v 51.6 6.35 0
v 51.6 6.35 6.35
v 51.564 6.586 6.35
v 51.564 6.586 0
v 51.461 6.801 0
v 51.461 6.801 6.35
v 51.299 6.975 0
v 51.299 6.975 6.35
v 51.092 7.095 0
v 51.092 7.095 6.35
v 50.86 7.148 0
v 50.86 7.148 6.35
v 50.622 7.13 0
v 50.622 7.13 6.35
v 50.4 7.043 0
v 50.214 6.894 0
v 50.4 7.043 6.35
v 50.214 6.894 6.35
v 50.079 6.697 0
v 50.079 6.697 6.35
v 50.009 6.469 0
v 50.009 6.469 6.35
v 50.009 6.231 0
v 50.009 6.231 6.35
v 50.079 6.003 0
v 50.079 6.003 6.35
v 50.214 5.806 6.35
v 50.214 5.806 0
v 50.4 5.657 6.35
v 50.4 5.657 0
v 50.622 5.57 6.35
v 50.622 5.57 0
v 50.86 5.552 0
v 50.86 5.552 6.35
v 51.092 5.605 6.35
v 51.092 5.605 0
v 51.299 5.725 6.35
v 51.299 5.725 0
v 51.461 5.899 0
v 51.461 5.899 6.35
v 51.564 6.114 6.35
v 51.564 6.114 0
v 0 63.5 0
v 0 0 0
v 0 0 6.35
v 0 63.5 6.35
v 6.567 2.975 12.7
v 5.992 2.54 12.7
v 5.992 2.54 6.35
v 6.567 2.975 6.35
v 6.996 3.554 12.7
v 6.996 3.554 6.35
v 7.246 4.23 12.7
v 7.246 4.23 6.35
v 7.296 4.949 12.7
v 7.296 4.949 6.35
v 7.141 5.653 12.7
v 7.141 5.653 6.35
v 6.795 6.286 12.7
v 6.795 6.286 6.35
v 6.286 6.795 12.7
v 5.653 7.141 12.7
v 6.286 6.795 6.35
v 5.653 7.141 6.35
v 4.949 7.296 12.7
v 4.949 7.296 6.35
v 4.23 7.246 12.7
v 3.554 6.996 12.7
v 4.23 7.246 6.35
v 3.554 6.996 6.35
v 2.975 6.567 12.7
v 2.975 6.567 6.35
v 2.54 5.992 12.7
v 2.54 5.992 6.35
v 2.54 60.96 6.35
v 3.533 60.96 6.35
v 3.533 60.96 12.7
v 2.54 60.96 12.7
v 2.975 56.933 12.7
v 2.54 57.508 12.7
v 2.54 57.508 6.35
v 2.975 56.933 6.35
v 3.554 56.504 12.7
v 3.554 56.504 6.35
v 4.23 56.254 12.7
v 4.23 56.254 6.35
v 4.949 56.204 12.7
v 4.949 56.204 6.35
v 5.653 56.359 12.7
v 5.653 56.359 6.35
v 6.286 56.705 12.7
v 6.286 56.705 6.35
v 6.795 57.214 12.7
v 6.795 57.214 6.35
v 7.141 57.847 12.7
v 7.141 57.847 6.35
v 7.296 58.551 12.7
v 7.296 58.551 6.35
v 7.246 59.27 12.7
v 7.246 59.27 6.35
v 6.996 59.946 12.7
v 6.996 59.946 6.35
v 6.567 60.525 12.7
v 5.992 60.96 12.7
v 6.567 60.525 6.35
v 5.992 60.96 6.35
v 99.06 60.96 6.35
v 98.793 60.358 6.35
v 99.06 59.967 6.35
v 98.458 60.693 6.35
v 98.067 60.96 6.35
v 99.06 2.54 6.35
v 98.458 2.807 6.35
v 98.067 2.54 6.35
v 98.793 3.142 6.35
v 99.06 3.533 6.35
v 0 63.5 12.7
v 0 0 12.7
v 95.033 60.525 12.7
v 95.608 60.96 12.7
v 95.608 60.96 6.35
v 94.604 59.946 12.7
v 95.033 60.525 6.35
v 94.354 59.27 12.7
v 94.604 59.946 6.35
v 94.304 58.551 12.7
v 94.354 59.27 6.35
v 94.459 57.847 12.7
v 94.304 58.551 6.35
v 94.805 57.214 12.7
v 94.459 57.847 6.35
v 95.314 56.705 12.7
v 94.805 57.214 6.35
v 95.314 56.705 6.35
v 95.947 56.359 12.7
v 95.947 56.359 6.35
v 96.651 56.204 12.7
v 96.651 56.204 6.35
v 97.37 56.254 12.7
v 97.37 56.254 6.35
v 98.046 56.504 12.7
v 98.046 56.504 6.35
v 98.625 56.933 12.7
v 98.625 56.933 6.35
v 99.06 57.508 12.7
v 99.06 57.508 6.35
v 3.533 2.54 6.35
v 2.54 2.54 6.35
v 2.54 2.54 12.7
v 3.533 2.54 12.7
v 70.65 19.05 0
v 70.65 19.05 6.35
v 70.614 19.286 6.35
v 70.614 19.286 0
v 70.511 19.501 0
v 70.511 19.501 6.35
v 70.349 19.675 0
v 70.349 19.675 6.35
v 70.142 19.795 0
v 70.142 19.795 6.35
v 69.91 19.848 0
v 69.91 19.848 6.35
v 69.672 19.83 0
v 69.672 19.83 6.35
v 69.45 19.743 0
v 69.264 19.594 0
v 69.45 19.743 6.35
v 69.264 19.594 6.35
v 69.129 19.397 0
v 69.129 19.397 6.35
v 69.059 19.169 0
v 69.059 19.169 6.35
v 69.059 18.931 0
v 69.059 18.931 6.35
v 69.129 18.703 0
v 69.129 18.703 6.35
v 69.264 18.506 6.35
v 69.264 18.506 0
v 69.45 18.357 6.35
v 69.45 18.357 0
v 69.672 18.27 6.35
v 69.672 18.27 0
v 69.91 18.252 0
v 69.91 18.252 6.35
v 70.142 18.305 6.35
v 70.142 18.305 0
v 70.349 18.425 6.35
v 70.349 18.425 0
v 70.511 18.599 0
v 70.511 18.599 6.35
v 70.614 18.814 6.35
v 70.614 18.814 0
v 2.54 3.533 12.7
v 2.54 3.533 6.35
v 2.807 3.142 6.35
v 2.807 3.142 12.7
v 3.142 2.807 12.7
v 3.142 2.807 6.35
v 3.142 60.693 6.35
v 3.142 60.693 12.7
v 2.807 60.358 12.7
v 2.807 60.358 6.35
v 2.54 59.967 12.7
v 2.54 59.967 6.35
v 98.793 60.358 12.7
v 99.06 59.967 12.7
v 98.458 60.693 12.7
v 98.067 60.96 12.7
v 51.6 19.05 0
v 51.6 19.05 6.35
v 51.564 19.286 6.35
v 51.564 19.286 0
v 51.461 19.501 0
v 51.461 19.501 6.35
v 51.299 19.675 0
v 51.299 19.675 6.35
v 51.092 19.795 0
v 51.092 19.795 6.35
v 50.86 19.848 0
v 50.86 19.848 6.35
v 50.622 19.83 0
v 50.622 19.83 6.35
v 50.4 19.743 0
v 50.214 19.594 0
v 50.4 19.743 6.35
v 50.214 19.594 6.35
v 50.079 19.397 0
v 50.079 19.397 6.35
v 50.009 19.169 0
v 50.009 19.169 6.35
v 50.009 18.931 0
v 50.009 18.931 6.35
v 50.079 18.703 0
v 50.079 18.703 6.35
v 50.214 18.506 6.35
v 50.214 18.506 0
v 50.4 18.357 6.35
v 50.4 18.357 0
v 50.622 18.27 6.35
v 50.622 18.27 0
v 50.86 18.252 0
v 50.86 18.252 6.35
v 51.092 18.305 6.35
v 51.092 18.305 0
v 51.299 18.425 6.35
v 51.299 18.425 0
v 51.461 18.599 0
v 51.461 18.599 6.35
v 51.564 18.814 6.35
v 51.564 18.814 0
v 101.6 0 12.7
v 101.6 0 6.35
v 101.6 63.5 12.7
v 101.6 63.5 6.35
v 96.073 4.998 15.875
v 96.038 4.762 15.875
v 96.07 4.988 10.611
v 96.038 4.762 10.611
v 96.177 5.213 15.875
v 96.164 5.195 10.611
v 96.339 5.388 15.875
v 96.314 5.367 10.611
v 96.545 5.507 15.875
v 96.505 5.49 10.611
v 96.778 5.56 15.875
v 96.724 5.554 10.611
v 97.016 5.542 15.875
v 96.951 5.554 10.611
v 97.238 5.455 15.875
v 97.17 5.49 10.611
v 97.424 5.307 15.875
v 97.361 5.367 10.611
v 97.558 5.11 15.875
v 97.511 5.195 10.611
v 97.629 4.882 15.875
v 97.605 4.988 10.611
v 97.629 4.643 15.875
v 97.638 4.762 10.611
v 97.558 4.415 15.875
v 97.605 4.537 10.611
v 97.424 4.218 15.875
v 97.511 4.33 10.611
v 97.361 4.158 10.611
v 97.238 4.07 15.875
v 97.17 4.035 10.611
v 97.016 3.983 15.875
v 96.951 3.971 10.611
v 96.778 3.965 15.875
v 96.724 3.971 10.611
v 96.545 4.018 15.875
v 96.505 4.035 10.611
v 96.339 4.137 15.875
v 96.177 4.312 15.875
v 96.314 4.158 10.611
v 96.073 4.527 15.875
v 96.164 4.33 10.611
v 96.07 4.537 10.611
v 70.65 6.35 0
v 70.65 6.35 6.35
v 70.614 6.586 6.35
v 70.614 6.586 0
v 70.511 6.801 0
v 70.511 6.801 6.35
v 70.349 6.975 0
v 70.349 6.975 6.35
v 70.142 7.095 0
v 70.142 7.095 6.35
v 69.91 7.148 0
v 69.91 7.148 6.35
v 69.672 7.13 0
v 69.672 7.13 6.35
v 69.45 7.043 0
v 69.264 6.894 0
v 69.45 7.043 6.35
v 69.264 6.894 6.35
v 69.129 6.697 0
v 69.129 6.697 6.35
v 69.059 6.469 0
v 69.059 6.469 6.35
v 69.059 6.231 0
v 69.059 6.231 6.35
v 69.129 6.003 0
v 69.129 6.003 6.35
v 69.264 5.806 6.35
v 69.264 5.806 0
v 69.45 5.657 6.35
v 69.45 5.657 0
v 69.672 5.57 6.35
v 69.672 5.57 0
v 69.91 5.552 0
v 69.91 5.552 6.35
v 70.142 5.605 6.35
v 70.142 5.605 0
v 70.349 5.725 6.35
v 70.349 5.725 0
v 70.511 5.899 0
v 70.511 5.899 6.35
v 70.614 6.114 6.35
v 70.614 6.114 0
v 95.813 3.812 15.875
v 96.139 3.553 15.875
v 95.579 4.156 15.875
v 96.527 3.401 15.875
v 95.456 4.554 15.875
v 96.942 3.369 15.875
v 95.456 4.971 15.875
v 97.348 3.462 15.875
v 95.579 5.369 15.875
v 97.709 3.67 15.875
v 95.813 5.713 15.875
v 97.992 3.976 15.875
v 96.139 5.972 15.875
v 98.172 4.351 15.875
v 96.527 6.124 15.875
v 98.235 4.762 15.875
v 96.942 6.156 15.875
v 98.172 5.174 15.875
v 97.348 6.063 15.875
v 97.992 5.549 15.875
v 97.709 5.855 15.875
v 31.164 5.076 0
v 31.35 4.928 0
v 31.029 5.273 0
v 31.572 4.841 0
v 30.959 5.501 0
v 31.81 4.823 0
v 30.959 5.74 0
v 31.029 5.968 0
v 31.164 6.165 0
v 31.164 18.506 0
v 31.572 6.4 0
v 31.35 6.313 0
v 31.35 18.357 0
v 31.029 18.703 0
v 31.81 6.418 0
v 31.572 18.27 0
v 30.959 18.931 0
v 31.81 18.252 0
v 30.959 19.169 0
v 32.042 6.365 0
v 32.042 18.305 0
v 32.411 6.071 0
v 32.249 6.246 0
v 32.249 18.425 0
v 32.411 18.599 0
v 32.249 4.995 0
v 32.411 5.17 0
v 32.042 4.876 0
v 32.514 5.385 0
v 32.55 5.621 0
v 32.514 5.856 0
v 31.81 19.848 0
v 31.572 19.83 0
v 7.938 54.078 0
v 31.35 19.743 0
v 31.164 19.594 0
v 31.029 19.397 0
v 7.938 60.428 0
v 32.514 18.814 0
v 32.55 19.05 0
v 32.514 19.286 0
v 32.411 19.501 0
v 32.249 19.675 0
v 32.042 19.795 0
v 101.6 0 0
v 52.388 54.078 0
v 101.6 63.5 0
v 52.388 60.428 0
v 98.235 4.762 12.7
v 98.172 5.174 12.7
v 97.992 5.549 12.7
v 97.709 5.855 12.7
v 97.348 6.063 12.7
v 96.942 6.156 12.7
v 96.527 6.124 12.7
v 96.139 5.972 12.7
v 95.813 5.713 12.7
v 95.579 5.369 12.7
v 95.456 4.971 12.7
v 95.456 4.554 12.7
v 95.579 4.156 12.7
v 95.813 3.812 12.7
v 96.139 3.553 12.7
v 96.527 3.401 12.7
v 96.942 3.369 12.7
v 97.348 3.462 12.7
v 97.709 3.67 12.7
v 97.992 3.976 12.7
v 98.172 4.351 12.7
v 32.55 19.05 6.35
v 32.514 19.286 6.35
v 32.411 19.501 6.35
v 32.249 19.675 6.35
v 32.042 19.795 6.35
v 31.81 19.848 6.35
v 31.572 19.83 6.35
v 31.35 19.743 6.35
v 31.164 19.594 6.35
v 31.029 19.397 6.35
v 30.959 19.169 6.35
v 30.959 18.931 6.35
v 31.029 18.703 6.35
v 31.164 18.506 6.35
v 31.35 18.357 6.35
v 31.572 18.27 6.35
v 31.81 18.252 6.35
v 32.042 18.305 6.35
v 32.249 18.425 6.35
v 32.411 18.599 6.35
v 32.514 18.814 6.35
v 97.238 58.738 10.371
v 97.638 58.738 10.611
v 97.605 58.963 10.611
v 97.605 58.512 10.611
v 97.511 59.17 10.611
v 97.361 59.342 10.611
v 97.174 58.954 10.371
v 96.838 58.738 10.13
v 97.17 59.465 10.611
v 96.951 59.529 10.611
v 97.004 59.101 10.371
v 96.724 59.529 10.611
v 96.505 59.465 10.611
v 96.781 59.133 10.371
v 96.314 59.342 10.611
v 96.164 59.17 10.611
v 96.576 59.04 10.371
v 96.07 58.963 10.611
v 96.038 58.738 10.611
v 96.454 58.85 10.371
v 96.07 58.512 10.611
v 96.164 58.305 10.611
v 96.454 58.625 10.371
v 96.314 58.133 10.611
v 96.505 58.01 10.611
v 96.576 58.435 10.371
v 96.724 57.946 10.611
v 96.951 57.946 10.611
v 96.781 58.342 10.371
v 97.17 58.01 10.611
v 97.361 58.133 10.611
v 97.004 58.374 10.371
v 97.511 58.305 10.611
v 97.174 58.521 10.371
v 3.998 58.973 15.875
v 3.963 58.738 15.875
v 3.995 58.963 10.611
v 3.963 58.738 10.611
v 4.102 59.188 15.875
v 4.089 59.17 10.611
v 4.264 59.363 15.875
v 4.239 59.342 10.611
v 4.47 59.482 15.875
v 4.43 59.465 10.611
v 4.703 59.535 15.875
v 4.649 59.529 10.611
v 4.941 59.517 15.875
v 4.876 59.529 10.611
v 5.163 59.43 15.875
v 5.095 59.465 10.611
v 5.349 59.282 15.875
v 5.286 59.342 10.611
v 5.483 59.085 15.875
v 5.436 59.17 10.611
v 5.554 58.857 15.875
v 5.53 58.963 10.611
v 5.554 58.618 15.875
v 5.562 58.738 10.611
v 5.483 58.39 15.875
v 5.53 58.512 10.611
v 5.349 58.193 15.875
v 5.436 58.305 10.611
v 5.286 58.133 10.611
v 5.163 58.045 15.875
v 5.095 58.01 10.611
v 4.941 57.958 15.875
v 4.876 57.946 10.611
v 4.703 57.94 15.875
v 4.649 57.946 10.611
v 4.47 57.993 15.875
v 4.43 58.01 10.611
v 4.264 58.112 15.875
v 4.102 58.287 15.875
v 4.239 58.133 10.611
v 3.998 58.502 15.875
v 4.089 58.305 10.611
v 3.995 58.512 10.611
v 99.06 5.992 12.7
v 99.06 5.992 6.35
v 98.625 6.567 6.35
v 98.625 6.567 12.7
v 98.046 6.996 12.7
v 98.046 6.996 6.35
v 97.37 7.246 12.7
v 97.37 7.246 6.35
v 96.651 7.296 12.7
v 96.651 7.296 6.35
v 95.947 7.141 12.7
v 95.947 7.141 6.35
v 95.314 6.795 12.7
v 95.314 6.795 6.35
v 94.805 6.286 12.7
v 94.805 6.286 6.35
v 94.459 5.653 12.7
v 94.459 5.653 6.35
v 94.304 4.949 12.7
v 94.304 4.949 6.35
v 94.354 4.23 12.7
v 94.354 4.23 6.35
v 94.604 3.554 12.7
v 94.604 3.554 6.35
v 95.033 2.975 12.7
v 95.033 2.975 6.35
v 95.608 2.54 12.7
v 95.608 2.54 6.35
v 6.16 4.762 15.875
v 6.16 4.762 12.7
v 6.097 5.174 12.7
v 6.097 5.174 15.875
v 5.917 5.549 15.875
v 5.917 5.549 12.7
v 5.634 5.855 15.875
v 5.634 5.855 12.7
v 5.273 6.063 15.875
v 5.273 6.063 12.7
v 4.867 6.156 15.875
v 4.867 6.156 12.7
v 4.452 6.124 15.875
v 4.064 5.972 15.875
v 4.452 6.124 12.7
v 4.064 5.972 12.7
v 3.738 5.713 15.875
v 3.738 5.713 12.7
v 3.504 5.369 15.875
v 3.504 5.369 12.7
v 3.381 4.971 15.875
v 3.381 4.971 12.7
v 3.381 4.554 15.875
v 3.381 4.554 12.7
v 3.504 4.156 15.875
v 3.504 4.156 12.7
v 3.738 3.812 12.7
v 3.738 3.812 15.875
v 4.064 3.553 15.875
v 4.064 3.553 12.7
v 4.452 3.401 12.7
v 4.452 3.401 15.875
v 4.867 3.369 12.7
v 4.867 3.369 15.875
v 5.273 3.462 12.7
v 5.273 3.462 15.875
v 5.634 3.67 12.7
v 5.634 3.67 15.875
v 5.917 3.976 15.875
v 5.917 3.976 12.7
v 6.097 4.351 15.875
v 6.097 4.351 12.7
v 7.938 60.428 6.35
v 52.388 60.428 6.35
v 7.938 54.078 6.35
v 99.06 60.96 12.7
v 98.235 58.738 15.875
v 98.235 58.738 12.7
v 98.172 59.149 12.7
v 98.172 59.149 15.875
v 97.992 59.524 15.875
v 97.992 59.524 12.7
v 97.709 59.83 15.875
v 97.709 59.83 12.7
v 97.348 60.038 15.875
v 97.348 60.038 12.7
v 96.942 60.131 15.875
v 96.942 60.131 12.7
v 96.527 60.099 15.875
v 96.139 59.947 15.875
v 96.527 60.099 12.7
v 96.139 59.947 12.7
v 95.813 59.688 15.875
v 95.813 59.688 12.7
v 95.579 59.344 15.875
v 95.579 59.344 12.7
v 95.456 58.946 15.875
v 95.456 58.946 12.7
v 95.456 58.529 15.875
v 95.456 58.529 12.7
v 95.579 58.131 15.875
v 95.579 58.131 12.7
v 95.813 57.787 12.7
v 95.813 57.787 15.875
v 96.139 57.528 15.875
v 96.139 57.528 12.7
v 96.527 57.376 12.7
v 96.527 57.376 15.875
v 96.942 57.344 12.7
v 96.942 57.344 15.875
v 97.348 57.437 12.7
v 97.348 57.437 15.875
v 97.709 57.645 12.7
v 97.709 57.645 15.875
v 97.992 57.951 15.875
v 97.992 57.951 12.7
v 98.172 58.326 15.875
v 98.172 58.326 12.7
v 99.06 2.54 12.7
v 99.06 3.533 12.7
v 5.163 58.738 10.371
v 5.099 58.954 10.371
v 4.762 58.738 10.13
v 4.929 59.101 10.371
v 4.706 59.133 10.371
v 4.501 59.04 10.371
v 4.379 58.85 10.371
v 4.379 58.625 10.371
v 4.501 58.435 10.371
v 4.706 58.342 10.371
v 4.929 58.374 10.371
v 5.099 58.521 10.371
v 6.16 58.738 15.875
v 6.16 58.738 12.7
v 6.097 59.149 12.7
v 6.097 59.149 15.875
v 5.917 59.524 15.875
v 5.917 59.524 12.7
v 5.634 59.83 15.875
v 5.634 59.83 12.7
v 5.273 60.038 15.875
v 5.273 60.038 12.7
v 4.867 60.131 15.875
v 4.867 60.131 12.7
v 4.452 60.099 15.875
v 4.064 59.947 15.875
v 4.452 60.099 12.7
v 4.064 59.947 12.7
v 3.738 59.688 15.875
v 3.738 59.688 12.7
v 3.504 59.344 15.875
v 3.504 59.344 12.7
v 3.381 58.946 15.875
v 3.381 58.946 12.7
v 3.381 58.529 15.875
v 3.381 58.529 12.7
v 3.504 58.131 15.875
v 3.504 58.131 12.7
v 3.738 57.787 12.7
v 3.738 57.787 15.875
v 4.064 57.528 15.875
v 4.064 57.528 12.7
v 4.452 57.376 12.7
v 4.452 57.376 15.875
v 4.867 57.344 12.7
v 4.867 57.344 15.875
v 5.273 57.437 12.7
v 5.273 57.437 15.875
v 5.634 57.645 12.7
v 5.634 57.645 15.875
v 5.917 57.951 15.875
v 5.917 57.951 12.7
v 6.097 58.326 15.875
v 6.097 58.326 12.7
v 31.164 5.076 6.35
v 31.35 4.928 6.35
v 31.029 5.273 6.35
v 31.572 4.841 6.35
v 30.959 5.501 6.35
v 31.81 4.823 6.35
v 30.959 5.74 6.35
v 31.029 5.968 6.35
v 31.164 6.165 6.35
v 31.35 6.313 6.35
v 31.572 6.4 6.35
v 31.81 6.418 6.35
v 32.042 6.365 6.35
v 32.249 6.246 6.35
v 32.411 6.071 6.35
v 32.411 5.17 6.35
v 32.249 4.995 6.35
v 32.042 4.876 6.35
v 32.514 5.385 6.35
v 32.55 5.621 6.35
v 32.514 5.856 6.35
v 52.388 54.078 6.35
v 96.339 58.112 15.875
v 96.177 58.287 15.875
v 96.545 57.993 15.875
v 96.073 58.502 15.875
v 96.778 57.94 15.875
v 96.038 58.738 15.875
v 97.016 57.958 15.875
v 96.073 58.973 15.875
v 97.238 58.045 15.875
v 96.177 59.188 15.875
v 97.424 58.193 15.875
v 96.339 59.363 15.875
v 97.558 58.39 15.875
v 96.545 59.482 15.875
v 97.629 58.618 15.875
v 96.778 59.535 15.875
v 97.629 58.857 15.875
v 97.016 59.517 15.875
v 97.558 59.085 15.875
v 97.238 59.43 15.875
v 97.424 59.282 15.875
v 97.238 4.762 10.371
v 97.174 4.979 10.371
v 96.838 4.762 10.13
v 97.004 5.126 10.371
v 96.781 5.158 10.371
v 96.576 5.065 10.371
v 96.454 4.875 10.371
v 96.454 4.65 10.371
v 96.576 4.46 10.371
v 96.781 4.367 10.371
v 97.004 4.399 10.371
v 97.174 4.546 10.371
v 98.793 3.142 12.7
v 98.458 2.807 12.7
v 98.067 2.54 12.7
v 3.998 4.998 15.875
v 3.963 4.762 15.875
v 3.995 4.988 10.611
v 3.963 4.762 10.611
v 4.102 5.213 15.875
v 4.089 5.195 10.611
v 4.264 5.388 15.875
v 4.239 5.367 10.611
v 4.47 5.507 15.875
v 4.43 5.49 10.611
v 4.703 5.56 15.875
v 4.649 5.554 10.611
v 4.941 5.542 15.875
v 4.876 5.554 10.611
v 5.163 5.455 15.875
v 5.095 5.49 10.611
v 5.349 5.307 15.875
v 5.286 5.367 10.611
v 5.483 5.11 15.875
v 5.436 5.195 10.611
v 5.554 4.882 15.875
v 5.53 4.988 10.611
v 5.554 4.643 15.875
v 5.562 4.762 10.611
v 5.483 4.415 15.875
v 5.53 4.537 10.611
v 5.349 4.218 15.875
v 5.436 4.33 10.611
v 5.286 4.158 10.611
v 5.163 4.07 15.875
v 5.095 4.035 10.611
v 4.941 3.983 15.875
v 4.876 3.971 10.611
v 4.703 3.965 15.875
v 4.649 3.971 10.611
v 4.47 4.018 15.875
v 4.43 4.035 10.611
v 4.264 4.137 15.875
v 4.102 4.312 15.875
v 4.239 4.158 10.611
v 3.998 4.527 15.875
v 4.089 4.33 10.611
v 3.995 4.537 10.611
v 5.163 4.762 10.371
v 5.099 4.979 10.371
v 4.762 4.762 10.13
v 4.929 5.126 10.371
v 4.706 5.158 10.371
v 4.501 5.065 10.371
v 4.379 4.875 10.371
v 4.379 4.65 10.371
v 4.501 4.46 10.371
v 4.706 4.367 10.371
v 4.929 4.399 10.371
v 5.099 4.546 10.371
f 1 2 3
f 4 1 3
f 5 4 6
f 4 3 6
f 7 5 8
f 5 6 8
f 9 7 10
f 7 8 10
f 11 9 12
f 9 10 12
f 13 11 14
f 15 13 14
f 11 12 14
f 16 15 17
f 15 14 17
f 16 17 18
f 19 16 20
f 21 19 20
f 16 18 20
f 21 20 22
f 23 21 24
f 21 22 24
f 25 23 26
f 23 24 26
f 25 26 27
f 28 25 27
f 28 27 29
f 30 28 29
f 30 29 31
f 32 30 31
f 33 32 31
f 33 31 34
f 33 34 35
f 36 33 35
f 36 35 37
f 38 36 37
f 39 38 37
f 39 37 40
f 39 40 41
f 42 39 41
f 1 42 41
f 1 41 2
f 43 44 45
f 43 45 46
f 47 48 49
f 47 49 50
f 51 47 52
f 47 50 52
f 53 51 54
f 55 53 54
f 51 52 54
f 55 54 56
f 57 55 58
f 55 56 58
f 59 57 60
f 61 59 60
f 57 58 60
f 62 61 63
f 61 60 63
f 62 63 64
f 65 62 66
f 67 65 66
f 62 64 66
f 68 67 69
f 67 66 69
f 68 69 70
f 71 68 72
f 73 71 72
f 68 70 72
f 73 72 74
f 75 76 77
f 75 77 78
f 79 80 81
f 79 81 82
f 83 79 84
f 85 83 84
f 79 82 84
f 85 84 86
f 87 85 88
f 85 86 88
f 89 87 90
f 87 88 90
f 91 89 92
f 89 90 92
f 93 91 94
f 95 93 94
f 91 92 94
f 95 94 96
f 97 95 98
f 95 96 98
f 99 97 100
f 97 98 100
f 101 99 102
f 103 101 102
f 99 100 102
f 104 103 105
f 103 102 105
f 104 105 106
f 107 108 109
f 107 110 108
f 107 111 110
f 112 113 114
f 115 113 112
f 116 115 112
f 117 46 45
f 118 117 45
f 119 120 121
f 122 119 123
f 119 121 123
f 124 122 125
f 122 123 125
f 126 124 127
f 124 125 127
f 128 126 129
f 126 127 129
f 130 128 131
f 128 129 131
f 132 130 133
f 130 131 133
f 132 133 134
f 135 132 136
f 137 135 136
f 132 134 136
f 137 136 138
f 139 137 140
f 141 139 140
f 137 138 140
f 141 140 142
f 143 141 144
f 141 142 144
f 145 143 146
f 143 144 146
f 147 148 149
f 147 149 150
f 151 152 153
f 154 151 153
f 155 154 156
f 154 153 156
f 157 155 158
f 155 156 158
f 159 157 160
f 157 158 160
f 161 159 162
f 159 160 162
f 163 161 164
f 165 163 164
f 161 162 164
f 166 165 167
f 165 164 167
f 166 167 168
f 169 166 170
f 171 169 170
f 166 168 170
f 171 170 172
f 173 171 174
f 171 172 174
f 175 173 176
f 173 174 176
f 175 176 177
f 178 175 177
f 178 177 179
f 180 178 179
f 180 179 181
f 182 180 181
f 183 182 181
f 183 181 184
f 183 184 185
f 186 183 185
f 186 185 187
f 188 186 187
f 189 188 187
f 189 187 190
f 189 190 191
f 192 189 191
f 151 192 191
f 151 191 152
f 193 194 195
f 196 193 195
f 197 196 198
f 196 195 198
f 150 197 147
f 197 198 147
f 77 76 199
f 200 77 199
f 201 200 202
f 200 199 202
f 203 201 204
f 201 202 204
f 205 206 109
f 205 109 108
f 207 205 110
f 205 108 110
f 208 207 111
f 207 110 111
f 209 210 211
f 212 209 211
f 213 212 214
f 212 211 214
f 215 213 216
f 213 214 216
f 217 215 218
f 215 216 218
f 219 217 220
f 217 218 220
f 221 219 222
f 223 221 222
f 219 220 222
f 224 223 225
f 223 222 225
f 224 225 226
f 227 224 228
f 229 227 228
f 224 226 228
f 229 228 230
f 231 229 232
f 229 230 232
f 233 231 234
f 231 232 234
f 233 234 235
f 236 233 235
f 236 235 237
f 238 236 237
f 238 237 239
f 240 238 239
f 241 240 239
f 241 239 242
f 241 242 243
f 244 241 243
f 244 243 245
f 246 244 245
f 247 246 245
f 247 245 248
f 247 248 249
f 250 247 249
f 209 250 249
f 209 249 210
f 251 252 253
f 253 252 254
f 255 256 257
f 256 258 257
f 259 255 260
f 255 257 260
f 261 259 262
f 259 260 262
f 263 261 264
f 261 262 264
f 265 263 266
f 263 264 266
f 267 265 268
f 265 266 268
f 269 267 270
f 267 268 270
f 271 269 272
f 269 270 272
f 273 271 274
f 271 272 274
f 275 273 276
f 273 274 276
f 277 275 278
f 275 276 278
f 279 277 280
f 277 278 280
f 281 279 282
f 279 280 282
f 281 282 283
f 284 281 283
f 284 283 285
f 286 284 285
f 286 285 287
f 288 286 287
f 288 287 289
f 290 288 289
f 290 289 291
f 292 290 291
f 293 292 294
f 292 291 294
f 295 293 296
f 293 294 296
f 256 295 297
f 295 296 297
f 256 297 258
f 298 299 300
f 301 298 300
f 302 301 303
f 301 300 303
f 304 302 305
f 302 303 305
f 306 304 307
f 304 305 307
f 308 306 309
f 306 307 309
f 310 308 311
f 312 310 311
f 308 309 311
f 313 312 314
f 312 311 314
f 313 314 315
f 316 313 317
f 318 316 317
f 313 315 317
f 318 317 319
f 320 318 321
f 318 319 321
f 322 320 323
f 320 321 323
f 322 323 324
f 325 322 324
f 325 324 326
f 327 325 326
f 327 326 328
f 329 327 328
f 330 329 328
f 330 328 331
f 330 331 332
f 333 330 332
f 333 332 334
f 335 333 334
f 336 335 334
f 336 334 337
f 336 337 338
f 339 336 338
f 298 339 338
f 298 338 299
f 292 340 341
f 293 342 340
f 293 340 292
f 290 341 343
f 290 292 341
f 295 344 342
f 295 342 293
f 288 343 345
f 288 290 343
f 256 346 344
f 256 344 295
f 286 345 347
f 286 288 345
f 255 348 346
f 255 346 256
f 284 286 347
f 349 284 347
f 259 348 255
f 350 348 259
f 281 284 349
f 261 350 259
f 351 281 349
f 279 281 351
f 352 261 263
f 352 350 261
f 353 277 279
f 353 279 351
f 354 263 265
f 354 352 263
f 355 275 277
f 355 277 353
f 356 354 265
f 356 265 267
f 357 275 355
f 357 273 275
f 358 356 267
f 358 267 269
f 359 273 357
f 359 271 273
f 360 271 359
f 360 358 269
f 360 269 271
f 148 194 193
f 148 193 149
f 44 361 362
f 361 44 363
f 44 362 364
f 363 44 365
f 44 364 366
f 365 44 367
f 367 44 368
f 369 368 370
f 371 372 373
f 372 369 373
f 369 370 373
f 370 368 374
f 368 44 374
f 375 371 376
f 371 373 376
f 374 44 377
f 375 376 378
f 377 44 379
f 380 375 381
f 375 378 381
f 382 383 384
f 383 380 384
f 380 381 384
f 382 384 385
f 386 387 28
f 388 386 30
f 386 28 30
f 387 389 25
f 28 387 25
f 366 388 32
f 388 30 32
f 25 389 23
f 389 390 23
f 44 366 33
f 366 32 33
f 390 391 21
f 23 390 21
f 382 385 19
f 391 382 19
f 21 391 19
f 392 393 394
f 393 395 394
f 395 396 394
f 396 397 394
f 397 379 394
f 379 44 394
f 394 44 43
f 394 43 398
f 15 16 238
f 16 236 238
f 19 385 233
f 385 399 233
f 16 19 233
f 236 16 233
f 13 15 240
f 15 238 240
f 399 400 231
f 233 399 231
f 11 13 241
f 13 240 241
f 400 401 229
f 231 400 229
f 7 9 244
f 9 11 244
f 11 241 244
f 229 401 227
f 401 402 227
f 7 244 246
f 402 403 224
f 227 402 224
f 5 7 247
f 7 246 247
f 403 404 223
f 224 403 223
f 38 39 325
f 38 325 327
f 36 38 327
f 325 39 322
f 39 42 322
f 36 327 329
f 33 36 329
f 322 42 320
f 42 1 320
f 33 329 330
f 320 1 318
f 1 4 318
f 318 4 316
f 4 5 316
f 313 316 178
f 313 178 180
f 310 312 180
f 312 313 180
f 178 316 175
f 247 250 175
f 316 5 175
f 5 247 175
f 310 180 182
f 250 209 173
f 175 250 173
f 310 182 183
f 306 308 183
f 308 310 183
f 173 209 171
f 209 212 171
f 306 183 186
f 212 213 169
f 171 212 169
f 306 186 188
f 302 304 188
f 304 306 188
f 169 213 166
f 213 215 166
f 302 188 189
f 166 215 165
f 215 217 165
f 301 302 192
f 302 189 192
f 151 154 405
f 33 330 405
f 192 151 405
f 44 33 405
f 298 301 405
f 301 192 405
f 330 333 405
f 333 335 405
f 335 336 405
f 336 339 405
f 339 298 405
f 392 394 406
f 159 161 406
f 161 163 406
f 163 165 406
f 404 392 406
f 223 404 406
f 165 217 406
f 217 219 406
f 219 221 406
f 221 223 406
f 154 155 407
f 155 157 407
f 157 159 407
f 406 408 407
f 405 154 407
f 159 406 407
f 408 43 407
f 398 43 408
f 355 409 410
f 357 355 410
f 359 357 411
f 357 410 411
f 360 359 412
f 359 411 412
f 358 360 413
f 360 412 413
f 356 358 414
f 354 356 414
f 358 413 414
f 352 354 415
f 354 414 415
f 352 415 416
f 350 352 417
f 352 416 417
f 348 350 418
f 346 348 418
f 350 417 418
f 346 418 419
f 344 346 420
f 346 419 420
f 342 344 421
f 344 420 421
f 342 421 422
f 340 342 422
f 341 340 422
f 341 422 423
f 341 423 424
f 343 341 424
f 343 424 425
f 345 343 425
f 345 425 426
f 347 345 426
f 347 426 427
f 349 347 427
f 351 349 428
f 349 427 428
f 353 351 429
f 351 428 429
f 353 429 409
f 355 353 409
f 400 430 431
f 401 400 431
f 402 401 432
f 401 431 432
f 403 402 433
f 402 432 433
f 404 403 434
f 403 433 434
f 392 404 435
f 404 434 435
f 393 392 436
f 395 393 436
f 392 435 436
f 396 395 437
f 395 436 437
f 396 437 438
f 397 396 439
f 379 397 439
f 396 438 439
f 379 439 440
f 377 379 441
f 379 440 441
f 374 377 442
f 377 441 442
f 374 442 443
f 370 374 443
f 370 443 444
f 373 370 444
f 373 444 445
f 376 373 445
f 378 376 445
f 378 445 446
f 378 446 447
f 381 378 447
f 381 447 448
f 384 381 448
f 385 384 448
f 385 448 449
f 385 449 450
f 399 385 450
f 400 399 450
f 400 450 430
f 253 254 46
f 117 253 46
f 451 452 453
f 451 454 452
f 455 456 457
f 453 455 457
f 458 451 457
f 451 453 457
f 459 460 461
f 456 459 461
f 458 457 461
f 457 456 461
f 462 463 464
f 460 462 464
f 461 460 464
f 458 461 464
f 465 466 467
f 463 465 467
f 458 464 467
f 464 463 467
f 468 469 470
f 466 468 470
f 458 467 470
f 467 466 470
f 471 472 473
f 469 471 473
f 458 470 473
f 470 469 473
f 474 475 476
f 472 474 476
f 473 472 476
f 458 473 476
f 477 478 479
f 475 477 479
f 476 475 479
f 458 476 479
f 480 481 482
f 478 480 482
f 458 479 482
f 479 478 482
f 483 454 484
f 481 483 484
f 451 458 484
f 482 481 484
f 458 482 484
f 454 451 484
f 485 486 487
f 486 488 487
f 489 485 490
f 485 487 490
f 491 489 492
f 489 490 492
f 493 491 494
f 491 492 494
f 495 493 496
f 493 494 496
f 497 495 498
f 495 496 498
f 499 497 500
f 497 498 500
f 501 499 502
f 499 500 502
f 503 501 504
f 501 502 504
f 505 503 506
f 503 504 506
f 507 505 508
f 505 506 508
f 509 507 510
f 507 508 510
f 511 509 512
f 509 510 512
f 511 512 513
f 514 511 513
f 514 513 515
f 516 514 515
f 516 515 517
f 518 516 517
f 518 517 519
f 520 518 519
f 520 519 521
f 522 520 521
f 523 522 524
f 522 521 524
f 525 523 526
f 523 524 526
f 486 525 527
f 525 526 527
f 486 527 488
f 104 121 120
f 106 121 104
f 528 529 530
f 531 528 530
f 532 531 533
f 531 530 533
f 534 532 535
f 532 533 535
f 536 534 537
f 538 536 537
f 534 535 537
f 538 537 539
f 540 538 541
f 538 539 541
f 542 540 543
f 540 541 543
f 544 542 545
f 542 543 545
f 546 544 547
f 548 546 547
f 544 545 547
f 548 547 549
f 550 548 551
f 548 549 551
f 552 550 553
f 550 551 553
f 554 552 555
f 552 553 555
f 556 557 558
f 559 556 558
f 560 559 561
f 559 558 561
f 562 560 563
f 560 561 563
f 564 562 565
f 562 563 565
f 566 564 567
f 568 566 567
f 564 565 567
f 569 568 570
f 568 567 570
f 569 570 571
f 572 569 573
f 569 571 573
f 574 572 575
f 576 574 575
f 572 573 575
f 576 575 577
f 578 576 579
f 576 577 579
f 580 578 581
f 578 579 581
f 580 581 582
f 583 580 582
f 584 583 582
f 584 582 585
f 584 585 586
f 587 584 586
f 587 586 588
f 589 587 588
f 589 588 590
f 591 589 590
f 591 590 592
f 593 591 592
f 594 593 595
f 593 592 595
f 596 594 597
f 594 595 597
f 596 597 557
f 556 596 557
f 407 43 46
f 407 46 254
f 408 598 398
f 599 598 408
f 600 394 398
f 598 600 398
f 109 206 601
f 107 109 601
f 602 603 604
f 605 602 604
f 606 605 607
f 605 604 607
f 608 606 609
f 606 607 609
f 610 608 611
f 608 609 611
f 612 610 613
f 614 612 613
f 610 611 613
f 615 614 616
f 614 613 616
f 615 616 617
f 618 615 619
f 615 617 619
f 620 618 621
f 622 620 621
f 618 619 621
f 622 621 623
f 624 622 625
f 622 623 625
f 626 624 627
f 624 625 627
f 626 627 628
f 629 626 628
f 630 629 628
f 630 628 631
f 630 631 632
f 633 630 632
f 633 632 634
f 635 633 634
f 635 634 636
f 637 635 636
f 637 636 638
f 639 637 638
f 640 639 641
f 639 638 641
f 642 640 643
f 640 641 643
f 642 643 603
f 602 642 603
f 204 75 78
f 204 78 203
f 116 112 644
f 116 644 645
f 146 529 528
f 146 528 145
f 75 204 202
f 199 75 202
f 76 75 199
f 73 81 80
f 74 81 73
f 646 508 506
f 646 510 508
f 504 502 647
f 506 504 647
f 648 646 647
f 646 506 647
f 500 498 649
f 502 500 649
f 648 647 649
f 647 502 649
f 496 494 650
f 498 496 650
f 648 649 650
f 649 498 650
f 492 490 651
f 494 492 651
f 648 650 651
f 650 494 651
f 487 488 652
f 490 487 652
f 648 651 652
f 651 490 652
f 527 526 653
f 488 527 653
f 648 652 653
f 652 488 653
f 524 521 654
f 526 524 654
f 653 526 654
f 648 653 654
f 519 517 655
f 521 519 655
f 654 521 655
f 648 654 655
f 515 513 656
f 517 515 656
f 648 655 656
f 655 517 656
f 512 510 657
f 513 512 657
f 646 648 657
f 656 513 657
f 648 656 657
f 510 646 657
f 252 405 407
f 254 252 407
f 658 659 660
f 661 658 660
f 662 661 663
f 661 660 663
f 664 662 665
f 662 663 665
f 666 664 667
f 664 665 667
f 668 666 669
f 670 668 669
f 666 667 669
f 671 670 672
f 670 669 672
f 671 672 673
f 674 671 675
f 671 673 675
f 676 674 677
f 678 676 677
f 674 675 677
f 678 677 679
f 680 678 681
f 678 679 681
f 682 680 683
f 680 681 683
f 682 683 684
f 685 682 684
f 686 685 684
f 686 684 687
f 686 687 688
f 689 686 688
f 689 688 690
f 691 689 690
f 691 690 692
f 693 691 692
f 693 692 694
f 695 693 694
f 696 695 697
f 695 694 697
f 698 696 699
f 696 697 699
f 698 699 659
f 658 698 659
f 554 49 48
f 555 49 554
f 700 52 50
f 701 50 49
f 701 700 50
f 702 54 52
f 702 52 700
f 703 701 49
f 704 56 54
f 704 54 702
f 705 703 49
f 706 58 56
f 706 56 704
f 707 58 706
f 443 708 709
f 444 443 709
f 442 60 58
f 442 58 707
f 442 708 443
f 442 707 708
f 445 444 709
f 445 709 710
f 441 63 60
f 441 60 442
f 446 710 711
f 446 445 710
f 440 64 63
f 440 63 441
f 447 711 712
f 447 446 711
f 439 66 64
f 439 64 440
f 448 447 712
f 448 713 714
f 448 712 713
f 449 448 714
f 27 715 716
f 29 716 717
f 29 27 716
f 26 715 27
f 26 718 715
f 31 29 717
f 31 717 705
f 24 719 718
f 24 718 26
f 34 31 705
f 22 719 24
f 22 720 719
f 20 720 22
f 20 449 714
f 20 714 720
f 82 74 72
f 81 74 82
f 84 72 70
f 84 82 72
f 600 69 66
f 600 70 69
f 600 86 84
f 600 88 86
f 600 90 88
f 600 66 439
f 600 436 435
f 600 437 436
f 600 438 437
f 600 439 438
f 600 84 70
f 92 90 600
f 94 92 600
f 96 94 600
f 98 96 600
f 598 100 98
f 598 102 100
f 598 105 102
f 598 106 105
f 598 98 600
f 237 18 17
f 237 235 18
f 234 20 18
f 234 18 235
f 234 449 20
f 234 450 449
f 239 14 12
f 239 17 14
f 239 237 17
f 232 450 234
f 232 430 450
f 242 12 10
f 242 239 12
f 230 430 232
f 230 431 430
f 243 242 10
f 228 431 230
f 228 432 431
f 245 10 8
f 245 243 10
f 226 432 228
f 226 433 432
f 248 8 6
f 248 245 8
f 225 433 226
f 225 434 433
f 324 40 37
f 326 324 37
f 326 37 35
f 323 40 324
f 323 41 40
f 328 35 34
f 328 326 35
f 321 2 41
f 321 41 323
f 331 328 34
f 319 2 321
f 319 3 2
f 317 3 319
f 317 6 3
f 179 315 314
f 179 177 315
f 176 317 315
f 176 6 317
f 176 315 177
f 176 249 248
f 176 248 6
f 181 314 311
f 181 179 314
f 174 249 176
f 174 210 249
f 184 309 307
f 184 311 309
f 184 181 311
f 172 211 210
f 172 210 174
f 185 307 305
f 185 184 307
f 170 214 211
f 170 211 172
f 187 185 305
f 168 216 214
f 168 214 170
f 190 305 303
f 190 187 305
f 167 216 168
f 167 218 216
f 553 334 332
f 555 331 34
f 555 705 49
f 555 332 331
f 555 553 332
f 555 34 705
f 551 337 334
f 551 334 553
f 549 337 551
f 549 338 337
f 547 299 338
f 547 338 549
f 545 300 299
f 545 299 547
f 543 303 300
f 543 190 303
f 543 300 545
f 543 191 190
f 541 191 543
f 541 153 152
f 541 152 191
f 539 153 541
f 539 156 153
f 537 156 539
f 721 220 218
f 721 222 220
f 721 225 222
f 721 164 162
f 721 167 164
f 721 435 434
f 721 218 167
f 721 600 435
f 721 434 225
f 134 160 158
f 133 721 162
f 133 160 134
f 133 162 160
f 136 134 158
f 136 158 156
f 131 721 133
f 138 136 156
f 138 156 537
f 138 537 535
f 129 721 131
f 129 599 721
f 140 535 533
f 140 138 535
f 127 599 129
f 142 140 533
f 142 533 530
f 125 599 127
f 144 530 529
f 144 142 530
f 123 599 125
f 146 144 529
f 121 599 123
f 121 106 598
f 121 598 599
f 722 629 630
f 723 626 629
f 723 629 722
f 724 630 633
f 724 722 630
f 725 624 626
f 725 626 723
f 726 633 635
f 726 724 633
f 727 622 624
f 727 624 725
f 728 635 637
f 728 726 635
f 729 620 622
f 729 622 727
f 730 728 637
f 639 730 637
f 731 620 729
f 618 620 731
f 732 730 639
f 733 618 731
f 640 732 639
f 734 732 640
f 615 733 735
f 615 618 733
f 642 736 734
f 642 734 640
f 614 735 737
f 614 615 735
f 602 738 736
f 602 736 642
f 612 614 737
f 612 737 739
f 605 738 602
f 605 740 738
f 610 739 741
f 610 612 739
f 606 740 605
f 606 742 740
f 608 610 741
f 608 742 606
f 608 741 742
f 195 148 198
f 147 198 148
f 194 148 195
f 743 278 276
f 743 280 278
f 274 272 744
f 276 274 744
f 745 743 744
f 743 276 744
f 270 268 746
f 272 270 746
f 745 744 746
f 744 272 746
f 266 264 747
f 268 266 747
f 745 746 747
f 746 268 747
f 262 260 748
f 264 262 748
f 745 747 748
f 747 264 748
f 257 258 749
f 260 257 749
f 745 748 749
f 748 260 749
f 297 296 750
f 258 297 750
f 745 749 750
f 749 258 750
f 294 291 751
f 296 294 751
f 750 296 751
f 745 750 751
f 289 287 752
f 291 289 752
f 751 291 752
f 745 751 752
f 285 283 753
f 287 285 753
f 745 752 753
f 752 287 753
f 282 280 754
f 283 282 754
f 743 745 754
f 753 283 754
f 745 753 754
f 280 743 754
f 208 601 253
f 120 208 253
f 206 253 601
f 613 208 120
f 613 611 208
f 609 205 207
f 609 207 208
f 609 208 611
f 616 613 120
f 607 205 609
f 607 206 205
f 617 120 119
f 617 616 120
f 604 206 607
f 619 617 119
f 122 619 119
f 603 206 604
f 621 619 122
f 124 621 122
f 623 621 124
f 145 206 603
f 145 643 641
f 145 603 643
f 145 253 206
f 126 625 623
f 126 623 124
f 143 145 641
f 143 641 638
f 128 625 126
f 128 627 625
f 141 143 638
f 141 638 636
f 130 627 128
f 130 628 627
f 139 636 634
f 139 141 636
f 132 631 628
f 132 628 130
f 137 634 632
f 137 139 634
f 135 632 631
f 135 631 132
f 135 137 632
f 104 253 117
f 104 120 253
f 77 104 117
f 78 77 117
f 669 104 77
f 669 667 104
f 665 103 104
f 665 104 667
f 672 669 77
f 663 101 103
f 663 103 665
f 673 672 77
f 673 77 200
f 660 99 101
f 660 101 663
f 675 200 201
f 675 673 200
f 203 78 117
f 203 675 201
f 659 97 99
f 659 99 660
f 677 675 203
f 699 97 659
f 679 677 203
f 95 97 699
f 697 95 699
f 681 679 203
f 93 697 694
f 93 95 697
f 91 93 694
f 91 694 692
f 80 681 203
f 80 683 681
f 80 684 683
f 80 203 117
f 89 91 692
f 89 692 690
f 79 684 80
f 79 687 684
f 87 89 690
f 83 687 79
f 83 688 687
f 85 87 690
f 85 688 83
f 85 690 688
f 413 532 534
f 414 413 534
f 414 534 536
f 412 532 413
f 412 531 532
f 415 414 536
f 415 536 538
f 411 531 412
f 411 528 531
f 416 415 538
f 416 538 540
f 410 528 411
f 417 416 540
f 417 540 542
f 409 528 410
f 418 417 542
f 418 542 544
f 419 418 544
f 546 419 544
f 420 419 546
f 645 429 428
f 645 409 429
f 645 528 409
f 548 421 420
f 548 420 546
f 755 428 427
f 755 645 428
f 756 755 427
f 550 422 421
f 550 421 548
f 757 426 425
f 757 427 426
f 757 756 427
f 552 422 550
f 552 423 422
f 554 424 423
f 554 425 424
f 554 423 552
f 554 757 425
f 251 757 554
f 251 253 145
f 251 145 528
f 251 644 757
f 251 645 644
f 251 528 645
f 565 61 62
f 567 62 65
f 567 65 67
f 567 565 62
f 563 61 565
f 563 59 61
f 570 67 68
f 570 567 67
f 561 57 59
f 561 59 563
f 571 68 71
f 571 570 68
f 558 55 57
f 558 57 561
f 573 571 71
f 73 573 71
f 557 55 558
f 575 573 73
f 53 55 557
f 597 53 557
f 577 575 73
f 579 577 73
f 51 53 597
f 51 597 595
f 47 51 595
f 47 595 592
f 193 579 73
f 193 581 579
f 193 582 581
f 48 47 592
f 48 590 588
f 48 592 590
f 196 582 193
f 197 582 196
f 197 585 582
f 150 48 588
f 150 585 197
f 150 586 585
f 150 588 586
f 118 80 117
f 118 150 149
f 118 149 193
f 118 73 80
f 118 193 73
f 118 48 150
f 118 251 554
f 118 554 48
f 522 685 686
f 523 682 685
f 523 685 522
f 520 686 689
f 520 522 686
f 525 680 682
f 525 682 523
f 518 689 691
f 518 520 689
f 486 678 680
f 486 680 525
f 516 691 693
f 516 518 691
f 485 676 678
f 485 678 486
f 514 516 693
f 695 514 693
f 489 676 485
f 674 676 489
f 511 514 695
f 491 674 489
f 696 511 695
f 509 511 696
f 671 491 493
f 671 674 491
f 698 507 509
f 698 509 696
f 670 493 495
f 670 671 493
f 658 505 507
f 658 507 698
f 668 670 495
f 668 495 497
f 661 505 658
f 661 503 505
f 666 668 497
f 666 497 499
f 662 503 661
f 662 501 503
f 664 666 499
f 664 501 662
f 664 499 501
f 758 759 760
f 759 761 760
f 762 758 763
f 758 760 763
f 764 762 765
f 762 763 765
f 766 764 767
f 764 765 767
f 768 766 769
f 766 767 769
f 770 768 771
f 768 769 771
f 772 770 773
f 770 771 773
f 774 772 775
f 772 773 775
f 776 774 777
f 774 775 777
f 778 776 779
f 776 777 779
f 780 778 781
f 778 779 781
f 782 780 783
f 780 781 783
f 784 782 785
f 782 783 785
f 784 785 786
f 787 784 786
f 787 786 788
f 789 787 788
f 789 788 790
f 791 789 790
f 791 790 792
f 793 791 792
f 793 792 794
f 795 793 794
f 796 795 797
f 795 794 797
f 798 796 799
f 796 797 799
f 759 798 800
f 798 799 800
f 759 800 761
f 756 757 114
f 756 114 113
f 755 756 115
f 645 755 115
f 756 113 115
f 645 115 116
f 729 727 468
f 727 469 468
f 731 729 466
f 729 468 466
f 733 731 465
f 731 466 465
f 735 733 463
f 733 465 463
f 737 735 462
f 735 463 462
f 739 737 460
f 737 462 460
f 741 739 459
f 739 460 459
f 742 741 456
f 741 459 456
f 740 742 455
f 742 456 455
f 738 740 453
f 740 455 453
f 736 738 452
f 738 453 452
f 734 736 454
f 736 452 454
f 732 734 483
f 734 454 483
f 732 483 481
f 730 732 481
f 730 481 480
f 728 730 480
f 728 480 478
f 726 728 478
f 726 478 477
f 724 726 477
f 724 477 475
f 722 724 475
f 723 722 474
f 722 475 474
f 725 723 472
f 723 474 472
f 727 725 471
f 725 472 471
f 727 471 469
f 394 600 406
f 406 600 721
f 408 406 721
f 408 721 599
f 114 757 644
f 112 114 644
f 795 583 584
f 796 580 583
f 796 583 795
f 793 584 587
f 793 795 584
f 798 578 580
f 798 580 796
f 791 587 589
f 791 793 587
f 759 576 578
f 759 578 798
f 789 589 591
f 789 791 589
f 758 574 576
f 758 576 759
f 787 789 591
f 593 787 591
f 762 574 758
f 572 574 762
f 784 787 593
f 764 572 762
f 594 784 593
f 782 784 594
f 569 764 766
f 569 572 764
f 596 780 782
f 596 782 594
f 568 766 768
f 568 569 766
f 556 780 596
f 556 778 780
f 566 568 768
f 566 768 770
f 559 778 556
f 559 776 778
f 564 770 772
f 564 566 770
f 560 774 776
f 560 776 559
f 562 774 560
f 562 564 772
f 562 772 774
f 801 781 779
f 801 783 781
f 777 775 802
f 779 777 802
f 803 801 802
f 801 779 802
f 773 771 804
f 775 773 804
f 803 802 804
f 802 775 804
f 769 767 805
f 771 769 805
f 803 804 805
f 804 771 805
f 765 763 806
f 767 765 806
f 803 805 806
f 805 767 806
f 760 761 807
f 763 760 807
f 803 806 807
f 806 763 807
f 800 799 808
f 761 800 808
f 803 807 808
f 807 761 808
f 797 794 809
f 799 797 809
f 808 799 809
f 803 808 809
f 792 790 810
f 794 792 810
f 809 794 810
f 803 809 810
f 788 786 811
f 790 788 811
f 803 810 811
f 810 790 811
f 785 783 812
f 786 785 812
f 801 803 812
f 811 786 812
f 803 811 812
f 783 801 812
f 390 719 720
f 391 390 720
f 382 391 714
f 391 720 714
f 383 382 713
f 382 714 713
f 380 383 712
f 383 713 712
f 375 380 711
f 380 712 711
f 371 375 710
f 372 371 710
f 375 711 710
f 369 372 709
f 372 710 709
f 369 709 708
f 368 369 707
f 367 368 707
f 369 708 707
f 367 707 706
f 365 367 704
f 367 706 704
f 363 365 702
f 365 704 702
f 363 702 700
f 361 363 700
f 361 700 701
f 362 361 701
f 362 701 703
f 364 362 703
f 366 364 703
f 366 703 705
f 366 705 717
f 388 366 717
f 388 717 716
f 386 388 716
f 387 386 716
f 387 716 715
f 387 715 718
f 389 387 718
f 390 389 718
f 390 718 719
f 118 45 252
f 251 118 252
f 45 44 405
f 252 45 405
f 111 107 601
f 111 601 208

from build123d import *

# Parameters (mm, degrees)
SKETCH2_W                 = 101.6
SKETCH2_H                 = 63.5
BOSS_EXTRUDE1_DEPTH       = 6.35
SKETCH3_R                 = 2.54
BOSS_EXTRUDE2_DEPTH       = 6.35
SKETCH4_R                 = 1.397
BOSS_EXTRUDE3_DEPTH       = 3.175
M2X0_4_TAPPED_HOLE1_D     = 1.6
M2X0_4_TAPPED_HOLE1_DEPTH = 5.2639976
M2X0_4_TAPPED_HOLE1_TIP   = 0.480688495
SKETCH8_W                 = 44.45
SKETCH8_H                 = 6.35
CUT_EXTRUDE1_DEPTH        = 8.255
BOSS_EXTRUDE5_DEPTH       = 6.35
M2X0_4_TAPPED_HOLE2_D     = 1.6


with BuildPart() as part:
    # Sketch2 → Boss-Extrude1 (new body)
    with BuildSketch(Plane.XY):
        with Locations((50.8, 31.75)):
            Rectangle(SKETCH2_W, SKETCH2_H)
    extrude(amount=BOSS_EXTRUDE1_DEPTH)

    # Sketch3 → Boss-Extrude2 (add)
    with BuildSketch(Plane.XY.offset(6.35)):
        with Locations(Location((4.7625, 4.7625, 0), (0, 0, 180))):
            Circle(SKETCH3_R)
        with Locations(Location((96.8375, 4.7625, 0), (0, 0, 180))):
            Circle(SKETCH3_R)
        with Locations(Location((96.8375, 58.7375, 0), (0, 0, 180))):
            Circle(SKETCH3_R)
        with Locations(Location((4.7625, 58.7375, 0), (0, 0, 180))):
            Circle(SKETCH3_R)
    extrude(amount=BOSS_EXTRUDE2_DEPTH)

    # Sketch4 → Boss-Extrude3 (add)
    with BuildSketch(Plane.XY.offset(12.7)):
        with Locations((4.7625, 58.7375)):
            Circle(SKETCH4_R)
        with Locations((4.7625, 4.7625)):
            Circle(SKETCH4_R)
        with Locations((96.8375, 58.7375)):
            Circle(SKETCH4_R)
        with Locations((96.8375, 4.7625)):
            Circle(SKETCH4_R)
    extrude(amount=BOSS_EXTRUDE3_DEPTH)

    # M2x0.4 Tapped Hole1
    with Locations(Plane.XY.offset(15.875)):
        with Locations((4.7625, 58.7375), (4.7625, 4.7625), (96.8375, 58.7375), (96.8375, 4.7625)):
            Hole(M2X0_4_TAPPED_HOLE1_D / 2, depth=M2X0_4_TAPPED_HOLE1_DEPTH)
            with Locations((0, 0, -(M2X0_4_TAPPED_HOLE1_DEPTH + M2X0_4_TAPPED_HOLE1_TIP / 2))):  # 118° drill point
                Cone(0, M2X0_4_TAPPED_HOLE1_D / 2, M2X0_4_TAPPED_HOLE1_TIP, mode=Mode.SUBTRACT)

    # Sketch8 → Cut-Extrude1 (cut)
    with BuildSketch(Plane.XY.offset(6.35)):
        with Locations((30.1625, 57.253105079)):
            Rectangle(SKETCH8_W, SKETCH8_H)
    extrude(amount=-CUT_EXTRUDE1_DEPTH, mode=Mode.SUBTRACT)

    # 3DSketch1 → Boss-Extrude5 (add)
    with BuildSketch(Plane(origin=(2.54, 2.54, 6.35), x_dir=(0.851658316704544, 0.5240974256643347, 0), z_dir=(0, 0, -1))):
        Polygon((83.034065392, 54.080303111), (116.314251921, 0), (29.785766944, -53.248298447), (-3.494419586, 0.832004663), align=None)
        Polygon((0, 0), (82.202060728, 50.585883525), (112.819832336, 0.832004663), (30.617771607, -49.753878862), align=None, mode=Mode.SUBTRACT)
    extrude(amount=-BOSS_EXTRUDE5_DEPTH)

    # M2x0.4 Tapped Hole2 (through all)
    with Locations(Plane(origin=(0, 0, 0), x_dir=(-1, 0, 0), z_dir=(0, 0, -1))):
        with Locations((-69.85, 19.05), (-50.8, 19.05), (-31.75, 19.05), (-69.85, 6.35), (-50.8, 6.35), (-31.75, 5.62052836)):
            Hole(M2X0_4_TAPPED_HOLE2_D / 2)


solid = part.part
